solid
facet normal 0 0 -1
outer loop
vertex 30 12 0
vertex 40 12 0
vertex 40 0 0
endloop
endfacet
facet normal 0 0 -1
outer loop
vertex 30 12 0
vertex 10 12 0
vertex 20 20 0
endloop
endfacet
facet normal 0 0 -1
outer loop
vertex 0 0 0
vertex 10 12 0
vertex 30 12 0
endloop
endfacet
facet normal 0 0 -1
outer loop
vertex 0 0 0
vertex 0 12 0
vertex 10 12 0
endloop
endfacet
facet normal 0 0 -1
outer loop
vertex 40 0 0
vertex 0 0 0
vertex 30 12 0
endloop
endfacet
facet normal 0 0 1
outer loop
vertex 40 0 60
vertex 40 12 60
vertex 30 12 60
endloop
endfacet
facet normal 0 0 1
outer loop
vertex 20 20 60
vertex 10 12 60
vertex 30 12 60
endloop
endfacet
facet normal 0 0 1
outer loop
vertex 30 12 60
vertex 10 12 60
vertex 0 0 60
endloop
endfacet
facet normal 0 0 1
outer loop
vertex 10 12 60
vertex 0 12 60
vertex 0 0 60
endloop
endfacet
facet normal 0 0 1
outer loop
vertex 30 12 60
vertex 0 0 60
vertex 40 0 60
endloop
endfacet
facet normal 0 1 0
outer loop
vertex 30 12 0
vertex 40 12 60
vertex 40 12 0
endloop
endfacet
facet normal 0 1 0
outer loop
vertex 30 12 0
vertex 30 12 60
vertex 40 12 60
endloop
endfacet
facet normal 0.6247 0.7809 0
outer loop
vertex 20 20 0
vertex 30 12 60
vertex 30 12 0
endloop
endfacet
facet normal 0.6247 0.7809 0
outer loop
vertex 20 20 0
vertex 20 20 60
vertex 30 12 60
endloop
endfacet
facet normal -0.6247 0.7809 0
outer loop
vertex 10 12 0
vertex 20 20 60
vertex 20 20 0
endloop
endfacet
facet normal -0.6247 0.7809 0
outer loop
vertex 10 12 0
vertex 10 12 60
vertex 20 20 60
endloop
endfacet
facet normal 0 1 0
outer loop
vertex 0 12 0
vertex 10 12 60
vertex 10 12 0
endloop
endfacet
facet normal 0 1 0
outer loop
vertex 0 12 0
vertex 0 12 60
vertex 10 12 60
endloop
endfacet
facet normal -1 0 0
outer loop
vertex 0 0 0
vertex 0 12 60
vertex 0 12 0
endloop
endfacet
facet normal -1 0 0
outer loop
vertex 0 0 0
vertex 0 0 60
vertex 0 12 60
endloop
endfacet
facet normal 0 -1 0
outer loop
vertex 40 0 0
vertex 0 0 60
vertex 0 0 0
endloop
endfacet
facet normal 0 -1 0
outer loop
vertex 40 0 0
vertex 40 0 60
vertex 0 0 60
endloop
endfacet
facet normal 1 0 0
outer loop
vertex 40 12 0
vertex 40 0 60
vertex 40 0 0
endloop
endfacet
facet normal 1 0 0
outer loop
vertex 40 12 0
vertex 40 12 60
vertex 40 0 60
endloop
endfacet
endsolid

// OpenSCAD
$fn = 32;

// ----------------------------------------------------------------------
// V guide rail: vrib, 40 mm wide
// ----------------------------------------------------------------------

// --- parameters (mm) ---
rail_w = 40;              // rail width, X
base_t = 12;              // base plate thickness
v_depth = 8;              // V feature depth / height
v_half_w = 10;            // half width of the V at the base face
plate_t = 60;             // rail length, Z (the extrusion height)

profile = [[0, 0], [40, 0], [40, 12], [30, 12], [20, 20], [10, 12], [0, 12]];  // primary outline, 7 points, counter clockwise

// --- the one profile operation ---
linear_extrude(height = plate_t) polygon(points = profile);
